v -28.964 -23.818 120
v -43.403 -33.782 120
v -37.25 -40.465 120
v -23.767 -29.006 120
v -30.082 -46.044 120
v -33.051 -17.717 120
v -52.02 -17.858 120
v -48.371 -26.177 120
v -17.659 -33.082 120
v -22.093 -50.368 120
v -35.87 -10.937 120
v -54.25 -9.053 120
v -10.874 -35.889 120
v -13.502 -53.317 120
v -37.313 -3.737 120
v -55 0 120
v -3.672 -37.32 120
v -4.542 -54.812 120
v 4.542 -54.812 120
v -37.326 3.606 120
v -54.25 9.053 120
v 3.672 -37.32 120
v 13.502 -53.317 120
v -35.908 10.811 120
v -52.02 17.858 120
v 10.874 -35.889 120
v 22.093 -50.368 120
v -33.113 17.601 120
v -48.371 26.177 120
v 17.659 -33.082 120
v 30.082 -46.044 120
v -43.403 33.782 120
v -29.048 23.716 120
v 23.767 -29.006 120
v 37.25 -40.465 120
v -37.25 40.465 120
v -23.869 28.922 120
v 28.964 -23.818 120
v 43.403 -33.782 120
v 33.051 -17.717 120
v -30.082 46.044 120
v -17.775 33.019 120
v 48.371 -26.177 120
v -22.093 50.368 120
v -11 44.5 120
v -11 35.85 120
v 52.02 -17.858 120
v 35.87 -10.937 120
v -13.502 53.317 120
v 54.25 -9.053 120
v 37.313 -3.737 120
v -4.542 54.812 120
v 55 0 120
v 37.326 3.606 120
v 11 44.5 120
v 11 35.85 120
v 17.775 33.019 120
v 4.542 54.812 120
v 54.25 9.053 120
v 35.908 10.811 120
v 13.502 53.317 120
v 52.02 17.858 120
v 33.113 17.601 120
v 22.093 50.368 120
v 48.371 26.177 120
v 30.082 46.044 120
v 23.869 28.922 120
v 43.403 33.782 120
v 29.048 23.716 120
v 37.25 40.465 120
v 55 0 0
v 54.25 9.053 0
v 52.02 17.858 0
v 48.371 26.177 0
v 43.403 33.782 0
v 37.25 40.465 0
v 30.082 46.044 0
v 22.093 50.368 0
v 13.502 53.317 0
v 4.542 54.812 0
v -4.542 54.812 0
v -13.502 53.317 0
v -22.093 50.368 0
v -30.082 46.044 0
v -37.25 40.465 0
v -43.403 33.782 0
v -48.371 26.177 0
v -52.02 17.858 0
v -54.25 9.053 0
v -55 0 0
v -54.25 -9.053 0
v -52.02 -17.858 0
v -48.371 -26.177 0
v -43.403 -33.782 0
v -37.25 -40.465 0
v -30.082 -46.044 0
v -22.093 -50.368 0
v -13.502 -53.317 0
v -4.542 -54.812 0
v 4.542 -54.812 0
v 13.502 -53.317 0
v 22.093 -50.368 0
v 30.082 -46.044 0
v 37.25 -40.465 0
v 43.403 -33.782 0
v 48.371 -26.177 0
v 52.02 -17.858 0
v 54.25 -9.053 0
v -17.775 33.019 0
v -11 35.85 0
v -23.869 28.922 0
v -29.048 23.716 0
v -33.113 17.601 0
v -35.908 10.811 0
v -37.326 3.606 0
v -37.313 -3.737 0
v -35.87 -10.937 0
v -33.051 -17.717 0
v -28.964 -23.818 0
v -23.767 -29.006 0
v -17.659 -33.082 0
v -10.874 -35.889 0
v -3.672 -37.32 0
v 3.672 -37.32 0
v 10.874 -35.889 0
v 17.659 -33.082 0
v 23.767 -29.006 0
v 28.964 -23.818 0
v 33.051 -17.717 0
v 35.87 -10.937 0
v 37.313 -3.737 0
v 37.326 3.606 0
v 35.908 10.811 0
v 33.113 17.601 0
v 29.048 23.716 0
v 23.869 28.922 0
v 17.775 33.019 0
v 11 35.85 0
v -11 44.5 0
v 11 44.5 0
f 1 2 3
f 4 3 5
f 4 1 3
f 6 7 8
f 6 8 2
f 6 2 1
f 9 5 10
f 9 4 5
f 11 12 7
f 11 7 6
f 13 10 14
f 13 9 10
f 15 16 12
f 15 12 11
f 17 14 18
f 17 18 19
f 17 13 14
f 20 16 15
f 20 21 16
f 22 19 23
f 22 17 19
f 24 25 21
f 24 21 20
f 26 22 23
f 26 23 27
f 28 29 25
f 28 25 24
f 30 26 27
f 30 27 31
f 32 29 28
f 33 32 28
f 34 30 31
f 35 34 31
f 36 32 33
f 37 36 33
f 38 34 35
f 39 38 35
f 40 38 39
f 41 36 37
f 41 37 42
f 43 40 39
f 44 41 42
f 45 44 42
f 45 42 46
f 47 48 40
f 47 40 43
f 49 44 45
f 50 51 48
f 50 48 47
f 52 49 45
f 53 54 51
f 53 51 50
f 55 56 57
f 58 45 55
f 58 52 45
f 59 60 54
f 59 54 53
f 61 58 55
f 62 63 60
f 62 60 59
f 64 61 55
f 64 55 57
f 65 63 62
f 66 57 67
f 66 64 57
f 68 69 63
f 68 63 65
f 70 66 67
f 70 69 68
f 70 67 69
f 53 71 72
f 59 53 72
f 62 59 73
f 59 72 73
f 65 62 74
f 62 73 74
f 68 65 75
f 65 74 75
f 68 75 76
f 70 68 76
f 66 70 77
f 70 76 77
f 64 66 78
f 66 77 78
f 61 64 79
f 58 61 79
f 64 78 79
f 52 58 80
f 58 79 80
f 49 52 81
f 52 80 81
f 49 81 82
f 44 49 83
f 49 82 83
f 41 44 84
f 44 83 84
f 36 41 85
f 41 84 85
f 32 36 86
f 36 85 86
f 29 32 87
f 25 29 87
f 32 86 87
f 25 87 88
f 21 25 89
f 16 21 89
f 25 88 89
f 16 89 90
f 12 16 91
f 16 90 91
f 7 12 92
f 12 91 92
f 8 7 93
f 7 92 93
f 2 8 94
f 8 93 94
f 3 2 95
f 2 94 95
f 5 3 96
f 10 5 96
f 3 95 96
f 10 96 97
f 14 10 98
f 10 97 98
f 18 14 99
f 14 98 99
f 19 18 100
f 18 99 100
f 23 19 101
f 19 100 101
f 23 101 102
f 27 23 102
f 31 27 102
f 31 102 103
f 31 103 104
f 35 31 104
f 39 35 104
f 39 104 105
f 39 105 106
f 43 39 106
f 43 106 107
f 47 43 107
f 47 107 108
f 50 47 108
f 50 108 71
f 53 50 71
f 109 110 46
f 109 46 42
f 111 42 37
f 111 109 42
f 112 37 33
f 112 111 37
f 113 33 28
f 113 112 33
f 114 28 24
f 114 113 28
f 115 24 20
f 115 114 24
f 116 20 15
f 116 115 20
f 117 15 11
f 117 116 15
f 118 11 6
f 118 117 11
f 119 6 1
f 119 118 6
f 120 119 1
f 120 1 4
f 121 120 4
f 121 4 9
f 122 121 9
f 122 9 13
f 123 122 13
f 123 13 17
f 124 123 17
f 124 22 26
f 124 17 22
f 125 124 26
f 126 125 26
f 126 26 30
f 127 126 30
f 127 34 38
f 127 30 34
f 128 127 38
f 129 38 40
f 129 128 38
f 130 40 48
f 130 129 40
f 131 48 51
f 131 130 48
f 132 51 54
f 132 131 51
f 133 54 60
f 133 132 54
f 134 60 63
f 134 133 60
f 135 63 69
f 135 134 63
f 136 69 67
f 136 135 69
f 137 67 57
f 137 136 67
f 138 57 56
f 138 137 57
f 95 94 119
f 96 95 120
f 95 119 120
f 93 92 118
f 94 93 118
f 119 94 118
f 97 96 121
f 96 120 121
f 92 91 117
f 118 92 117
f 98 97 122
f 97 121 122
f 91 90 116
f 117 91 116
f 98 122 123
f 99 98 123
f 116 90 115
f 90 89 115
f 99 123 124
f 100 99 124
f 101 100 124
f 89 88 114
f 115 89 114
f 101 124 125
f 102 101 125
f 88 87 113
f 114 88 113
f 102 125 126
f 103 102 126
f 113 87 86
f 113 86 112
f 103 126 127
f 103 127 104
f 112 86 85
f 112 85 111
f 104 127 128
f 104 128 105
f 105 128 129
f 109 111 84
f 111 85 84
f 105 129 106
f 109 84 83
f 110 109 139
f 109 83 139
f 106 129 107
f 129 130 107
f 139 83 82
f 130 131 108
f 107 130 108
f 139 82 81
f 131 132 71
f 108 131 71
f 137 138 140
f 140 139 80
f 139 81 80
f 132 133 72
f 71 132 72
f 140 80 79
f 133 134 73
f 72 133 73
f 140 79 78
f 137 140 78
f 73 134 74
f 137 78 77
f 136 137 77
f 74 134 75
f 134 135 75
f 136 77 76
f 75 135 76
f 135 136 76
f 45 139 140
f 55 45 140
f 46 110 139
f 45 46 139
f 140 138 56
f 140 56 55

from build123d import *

# Parameters (mm, degrees)
SKETCH1_R               = 55
SKETCH1_R_2             = 37.5
BOSS_EXTRUDE1_DEPTH     = 120
CUT_EXTRUDE1_DEPTH      = 144.003496461
CUT_EXTRUDE1_DEPTH_BACK = 144.003496461
SKETCH2_W               = 22
SKETCH2_H               = 14


with BuildPart() as part:
    # Sketch1 → Boss-Extrude1 (new body)
    with BuildSketch(Plane.XY):
        Circle(SKETCH1_R)
        Circle(SKETCH1_R_2, mode=Mode.SUBTRACT)
    extrude(amount=BOSS_EXTRUDE1_DEPTH)

    # Sketch2 → Cut-Extrude1 (cut, two sides: drawn at the far end of the back side and taken through both)
    with BuildSketch(Plane.XY.offset(120).offset(-CUT_EXTRUDE1_DEPTH_BACK)):
        with Locations((0, 37.5)):
            Rectangle(SKETCH2_W, SKETCH2_H)
    extrude(amount=CUT_EXTRUDE1_DEPTH + CUT_EXTRUDE1_DEPTH_BACK, mode=Mode.SUBTRACT)


solid = part.part
